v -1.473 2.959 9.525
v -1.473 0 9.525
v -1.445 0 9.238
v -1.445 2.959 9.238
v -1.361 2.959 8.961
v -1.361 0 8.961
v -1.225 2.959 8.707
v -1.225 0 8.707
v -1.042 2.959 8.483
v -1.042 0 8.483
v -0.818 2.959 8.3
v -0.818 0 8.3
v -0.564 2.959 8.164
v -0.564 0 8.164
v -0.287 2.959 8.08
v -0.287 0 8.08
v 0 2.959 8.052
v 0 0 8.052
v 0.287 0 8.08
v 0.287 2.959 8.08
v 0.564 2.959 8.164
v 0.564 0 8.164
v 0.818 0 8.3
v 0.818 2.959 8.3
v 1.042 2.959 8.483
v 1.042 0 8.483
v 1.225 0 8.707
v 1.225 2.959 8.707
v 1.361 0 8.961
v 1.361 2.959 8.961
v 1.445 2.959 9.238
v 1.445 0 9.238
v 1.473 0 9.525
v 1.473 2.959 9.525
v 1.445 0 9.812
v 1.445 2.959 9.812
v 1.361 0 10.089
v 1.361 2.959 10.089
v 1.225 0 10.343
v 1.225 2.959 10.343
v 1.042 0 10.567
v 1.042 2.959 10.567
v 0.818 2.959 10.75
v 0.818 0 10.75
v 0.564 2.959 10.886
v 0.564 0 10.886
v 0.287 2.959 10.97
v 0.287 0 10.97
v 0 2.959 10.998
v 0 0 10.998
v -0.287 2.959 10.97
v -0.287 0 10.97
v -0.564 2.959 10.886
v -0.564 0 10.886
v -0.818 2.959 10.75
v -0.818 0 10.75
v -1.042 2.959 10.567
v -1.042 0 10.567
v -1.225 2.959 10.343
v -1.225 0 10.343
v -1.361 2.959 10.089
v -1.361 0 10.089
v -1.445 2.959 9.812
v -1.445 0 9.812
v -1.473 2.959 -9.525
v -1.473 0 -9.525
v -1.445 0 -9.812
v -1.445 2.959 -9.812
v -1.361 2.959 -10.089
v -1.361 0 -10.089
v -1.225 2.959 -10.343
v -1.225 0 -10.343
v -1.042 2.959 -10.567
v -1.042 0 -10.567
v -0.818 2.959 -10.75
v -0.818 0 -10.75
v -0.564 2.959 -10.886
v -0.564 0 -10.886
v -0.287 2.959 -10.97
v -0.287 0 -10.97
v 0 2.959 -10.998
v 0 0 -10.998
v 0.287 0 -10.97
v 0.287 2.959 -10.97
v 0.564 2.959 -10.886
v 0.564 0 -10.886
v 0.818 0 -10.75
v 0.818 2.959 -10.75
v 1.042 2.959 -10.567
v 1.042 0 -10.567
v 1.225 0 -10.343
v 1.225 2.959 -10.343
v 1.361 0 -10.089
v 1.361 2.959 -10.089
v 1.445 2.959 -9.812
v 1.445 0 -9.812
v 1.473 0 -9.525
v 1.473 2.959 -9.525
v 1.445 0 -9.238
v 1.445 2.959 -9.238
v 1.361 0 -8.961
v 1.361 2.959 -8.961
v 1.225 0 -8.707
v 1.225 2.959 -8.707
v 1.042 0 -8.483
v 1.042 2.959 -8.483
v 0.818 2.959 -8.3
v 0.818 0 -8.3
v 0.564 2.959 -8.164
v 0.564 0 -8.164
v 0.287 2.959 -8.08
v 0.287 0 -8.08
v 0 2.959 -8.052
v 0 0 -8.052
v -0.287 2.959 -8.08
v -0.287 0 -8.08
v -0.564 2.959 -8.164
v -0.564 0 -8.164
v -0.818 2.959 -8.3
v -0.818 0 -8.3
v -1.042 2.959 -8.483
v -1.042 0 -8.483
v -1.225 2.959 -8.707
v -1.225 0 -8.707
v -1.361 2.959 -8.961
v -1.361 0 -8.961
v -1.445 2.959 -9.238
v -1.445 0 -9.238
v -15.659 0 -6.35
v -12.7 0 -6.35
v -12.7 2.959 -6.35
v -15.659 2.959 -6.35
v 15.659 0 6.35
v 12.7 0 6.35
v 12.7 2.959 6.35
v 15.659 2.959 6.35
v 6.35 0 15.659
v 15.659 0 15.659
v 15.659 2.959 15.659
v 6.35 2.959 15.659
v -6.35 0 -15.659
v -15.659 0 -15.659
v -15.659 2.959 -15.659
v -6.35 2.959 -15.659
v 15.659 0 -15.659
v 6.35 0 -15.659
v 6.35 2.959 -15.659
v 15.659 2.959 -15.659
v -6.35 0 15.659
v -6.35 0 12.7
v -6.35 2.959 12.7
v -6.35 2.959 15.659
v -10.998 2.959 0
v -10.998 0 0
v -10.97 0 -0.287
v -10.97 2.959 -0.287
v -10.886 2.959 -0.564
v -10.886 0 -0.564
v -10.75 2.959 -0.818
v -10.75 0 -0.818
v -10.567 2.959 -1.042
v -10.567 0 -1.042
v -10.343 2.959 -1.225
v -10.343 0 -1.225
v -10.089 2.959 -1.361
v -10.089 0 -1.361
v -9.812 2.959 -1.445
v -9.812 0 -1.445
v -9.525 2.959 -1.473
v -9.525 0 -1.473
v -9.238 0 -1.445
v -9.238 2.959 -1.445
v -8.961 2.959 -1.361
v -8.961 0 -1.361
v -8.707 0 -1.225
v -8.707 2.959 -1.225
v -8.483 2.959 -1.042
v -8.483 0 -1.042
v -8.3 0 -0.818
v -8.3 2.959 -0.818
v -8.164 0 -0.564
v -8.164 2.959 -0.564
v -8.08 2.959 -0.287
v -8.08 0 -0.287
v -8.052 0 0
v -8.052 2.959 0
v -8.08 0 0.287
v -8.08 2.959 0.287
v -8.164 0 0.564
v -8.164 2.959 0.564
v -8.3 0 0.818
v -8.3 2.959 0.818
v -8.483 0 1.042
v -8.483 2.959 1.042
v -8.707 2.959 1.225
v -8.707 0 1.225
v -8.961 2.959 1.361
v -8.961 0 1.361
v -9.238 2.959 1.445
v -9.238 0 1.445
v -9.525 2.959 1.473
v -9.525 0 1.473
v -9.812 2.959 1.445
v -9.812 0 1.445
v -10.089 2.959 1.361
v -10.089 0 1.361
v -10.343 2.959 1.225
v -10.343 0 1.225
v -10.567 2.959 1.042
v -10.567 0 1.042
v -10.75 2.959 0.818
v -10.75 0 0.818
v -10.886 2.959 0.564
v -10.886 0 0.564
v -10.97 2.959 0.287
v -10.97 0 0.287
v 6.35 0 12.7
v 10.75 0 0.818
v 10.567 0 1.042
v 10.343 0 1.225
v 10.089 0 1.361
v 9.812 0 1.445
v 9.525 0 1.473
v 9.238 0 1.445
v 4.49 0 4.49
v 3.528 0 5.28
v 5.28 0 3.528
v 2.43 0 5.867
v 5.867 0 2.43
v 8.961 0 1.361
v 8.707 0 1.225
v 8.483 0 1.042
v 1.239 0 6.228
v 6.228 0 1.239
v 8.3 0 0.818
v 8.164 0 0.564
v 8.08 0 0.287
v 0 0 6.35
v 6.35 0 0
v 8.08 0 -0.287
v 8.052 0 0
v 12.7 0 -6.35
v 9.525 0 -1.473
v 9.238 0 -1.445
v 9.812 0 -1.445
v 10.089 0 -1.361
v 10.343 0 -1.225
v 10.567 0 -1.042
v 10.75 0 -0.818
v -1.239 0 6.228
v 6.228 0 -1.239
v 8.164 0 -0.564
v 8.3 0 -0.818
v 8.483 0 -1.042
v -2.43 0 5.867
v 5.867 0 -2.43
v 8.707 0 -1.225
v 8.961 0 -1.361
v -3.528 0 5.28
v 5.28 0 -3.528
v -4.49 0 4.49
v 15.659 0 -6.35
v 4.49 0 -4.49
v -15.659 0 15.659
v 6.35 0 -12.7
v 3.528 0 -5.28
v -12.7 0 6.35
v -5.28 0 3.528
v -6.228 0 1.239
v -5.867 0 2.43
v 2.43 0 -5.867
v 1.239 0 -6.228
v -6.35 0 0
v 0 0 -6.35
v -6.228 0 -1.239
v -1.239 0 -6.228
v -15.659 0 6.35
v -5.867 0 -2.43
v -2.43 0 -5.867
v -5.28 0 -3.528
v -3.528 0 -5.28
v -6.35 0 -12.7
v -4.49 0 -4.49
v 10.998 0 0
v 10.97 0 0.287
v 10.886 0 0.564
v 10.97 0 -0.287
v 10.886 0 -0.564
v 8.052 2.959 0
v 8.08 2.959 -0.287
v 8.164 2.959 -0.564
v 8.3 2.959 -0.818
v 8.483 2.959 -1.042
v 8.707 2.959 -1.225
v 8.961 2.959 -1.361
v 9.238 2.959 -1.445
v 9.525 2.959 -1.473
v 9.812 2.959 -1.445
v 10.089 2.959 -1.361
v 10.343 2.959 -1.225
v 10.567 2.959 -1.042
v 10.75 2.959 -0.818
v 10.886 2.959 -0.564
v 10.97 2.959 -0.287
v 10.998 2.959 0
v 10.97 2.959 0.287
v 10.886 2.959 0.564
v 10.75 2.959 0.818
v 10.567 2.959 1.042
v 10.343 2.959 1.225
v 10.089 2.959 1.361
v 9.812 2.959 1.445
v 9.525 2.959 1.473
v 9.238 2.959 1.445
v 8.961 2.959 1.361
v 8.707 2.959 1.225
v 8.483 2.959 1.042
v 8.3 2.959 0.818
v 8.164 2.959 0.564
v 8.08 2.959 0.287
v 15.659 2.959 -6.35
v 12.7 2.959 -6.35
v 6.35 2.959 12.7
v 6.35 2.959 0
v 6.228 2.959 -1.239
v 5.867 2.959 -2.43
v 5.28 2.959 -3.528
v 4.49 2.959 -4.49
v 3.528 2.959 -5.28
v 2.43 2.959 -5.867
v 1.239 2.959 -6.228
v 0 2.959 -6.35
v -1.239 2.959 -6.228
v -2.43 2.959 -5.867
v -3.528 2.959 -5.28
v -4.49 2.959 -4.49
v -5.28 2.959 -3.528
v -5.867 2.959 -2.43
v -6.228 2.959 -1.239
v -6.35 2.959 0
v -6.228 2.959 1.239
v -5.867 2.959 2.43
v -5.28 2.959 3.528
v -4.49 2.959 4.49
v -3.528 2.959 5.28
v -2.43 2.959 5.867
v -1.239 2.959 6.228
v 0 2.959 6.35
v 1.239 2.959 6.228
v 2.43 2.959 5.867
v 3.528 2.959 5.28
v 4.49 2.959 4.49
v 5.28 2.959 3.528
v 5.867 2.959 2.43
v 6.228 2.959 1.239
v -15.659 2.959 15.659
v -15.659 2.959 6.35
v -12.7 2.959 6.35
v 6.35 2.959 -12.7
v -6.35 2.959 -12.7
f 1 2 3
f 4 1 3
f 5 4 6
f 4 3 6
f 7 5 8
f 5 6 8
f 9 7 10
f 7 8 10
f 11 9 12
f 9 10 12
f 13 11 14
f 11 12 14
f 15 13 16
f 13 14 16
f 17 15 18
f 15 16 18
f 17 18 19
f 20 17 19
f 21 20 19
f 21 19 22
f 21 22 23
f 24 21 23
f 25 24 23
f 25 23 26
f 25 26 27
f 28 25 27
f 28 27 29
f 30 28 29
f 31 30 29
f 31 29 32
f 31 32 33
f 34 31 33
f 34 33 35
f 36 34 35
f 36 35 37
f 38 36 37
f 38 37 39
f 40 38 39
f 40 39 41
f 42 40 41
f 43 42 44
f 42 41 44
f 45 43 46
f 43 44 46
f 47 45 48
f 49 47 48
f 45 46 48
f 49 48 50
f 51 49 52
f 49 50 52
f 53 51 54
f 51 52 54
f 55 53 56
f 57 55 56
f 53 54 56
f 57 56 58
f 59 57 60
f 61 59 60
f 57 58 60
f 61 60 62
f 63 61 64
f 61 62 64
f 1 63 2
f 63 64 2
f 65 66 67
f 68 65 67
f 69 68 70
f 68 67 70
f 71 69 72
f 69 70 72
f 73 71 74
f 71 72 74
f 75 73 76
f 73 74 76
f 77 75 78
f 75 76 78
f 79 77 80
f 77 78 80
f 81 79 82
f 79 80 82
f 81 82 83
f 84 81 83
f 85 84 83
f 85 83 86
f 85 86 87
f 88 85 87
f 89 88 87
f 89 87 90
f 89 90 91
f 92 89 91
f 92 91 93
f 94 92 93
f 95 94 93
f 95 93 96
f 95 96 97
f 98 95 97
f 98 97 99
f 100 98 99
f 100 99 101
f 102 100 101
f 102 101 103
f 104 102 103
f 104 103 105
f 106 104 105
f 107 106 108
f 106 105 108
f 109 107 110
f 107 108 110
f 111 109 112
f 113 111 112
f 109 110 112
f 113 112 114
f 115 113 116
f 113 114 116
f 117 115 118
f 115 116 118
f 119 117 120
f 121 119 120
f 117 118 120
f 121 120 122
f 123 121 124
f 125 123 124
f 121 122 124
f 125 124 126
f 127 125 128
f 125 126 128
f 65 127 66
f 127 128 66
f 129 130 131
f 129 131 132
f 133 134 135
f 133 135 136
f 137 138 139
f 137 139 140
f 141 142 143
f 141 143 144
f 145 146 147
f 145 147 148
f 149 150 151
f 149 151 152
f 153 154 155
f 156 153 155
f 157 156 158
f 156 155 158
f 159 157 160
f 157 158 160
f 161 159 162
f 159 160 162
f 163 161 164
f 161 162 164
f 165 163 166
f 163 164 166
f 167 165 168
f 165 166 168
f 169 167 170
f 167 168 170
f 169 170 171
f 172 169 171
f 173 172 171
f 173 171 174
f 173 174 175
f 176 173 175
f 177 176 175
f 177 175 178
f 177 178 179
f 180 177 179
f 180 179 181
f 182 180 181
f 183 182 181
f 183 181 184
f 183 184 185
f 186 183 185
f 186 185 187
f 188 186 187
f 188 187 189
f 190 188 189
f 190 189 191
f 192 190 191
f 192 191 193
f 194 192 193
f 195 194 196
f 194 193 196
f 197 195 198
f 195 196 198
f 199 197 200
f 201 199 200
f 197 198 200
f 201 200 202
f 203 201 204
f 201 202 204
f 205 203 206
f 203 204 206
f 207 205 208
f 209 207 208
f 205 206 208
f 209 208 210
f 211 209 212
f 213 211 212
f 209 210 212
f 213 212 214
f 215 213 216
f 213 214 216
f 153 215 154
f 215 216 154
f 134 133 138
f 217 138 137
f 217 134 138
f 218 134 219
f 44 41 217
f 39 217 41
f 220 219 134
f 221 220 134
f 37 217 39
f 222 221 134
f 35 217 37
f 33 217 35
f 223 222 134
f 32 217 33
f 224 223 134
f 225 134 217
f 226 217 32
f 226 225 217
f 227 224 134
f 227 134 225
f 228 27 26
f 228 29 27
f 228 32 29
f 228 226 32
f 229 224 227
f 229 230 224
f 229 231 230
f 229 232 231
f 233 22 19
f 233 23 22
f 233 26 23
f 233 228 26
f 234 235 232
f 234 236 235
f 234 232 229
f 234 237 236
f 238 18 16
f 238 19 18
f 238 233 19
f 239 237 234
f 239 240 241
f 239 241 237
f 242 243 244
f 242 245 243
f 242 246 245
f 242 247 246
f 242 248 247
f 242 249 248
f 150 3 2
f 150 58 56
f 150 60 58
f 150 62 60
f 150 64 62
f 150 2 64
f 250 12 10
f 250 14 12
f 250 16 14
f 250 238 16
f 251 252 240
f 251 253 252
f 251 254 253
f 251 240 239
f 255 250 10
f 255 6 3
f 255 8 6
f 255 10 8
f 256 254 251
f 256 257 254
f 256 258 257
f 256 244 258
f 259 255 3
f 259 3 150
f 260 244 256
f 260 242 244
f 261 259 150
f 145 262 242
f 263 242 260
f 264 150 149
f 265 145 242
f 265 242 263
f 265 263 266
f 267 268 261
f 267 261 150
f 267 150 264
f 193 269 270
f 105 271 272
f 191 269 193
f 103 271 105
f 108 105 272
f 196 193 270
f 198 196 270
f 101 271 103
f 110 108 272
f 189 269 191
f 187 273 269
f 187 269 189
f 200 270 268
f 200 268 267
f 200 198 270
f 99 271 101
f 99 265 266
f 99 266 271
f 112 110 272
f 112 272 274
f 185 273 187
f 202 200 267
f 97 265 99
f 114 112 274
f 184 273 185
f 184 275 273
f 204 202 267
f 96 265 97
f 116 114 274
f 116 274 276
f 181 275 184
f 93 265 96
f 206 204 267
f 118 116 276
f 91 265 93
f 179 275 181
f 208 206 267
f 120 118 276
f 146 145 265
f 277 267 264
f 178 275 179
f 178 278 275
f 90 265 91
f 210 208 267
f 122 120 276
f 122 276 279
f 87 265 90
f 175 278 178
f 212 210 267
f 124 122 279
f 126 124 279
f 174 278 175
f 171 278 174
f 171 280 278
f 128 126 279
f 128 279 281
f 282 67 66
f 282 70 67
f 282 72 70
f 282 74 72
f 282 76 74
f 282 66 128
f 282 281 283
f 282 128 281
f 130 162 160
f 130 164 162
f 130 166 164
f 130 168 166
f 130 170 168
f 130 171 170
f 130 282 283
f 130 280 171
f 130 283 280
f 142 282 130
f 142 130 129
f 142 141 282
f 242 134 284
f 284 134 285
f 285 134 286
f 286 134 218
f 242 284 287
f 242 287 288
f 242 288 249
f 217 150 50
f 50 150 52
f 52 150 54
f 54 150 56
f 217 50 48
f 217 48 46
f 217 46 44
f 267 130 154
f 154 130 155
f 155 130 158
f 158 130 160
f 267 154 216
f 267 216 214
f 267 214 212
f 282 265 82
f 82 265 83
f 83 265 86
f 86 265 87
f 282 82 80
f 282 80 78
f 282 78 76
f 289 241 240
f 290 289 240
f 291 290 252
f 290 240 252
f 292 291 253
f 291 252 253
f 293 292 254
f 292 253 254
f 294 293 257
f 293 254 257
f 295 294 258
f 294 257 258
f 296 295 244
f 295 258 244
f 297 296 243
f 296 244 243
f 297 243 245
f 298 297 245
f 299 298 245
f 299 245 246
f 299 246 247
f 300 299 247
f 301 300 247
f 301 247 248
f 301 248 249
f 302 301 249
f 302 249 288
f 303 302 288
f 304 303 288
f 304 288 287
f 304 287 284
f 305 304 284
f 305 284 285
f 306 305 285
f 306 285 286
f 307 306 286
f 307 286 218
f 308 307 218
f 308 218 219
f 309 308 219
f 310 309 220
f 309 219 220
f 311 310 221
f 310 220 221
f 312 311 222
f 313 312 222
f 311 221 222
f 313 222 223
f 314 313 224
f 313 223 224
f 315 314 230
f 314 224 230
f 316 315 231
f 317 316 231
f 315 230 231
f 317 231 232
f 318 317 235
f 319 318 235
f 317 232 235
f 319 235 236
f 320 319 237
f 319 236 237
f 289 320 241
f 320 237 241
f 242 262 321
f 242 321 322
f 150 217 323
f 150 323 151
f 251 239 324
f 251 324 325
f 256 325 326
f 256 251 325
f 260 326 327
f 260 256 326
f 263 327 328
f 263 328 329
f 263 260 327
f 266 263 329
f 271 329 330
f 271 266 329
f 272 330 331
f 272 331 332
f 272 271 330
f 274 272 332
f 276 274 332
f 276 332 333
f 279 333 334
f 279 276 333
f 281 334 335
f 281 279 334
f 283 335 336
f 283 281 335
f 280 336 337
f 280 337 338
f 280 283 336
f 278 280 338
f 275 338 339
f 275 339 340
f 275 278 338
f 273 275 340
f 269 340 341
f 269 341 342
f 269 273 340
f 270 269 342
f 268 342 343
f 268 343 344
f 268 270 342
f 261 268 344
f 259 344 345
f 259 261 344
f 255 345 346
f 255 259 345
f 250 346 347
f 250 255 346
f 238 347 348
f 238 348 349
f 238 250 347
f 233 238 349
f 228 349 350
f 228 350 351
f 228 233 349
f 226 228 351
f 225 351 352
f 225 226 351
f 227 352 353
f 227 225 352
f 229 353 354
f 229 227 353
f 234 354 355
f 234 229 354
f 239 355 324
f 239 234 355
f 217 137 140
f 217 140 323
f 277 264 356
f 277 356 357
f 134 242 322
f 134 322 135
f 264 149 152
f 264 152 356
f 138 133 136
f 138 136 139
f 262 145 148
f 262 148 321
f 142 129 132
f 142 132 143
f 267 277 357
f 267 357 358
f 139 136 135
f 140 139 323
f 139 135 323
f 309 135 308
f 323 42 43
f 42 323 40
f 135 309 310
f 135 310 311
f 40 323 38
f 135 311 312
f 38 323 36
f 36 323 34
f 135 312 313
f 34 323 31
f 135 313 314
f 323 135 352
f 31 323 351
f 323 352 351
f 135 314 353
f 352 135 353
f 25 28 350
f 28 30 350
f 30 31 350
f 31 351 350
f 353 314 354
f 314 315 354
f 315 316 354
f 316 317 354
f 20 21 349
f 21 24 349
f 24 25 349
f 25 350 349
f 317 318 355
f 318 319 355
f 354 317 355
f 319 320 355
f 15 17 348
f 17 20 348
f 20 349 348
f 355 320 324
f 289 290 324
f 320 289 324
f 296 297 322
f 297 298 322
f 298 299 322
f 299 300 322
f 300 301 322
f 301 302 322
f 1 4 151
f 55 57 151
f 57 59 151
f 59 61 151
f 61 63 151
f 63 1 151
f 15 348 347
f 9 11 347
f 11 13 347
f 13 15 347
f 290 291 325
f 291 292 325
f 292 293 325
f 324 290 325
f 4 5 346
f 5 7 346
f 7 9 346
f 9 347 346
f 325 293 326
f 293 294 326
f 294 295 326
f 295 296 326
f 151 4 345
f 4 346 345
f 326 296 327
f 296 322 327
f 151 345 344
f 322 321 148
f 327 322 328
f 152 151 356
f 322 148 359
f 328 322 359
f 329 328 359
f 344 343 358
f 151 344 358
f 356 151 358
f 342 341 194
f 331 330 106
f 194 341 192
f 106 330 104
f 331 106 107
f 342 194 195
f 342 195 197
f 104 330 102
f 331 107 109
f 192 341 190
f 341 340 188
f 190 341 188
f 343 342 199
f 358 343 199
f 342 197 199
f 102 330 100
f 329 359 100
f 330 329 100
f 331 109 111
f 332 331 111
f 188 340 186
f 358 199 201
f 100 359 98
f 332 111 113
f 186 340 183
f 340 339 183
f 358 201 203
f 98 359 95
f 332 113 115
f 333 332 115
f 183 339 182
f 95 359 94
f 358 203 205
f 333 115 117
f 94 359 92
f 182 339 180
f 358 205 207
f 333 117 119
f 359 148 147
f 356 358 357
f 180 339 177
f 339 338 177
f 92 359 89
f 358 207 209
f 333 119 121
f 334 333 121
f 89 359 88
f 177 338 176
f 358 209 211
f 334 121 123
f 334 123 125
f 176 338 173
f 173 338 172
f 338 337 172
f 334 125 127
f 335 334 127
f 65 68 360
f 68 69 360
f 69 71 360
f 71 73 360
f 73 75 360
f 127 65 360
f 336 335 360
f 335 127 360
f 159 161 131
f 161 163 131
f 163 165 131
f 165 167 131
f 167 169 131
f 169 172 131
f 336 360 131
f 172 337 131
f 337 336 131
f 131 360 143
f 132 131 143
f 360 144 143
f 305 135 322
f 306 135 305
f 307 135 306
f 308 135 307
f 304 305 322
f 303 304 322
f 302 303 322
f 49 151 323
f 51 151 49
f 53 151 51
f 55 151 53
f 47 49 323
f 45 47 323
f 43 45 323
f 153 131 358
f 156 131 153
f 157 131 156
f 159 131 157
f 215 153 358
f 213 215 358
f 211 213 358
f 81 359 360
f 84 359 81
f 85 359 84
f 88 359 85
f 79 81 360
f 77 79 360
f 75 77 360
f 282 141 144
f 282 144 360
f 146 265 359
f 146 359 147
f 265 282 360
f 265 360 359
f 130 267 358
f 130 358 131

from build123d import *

# Parameters (mm, degrees)
SKETCH1_R                 = 6.35
BOSS_EXTRUDE1_DEPTH       = 2.9591
F_4_CLEARANCE_HOLE1_D     = 2.9464
F_4_CLEARANCE_HOLE1_DEPTH = 2.9591


with BuildPart() as part:
    # Sketch1 → Boss-Extrude1 (new body)
    with BuildSketch(Plane(origin=(0, 0, 0), x_dir=(1, 0, 0), z_dir=(0, 1, 0))):
        Polygon((6.35, 15.6591), (15.6591, 15.6591), (15.6591, 6.35), (12.7, 6.35), (12.7, -6.35), (15.6591, -6.35), (15.6591, -15.6591), (6.35, -15.6591), (6.35, -12.7), (-6.35, -12.7), (-6.35, -15.6591), (-15.6591, -15.6591), (-15.6591, -6.35), (-12.7, -6.35), (-12.7, 6.35), (-15.6591, 6.35), (-15.6591, 15.6591), (-6.35, 15.6591), (-6.35, 12.7), (6.35, 12.7), align=None)
        Circle(SKETCH1_R, mode=Mode.SUBTRACT)
    extrude(amount=BOSS_EXTRUDE1_DEPTH)

    # #4 Clearance Hole1
    with Locations(Plane(origin=(-7.797262335, 2.9591, -11.472083192), x_dir=(1, 0, 0), z_dir=(0, 1, 0))):
        with Locations((7.797262335, -1.947083192), (17.322262335, -11.472083192), (7.797262335, -20.997083192), (-1.727737665, -11.472083192)):
            Hole(F_4_CLEARANCE_HOLE1_D / 2, depth=F_4_CLEARANCE_HOLE1_DEPTH)


solid = part.part
